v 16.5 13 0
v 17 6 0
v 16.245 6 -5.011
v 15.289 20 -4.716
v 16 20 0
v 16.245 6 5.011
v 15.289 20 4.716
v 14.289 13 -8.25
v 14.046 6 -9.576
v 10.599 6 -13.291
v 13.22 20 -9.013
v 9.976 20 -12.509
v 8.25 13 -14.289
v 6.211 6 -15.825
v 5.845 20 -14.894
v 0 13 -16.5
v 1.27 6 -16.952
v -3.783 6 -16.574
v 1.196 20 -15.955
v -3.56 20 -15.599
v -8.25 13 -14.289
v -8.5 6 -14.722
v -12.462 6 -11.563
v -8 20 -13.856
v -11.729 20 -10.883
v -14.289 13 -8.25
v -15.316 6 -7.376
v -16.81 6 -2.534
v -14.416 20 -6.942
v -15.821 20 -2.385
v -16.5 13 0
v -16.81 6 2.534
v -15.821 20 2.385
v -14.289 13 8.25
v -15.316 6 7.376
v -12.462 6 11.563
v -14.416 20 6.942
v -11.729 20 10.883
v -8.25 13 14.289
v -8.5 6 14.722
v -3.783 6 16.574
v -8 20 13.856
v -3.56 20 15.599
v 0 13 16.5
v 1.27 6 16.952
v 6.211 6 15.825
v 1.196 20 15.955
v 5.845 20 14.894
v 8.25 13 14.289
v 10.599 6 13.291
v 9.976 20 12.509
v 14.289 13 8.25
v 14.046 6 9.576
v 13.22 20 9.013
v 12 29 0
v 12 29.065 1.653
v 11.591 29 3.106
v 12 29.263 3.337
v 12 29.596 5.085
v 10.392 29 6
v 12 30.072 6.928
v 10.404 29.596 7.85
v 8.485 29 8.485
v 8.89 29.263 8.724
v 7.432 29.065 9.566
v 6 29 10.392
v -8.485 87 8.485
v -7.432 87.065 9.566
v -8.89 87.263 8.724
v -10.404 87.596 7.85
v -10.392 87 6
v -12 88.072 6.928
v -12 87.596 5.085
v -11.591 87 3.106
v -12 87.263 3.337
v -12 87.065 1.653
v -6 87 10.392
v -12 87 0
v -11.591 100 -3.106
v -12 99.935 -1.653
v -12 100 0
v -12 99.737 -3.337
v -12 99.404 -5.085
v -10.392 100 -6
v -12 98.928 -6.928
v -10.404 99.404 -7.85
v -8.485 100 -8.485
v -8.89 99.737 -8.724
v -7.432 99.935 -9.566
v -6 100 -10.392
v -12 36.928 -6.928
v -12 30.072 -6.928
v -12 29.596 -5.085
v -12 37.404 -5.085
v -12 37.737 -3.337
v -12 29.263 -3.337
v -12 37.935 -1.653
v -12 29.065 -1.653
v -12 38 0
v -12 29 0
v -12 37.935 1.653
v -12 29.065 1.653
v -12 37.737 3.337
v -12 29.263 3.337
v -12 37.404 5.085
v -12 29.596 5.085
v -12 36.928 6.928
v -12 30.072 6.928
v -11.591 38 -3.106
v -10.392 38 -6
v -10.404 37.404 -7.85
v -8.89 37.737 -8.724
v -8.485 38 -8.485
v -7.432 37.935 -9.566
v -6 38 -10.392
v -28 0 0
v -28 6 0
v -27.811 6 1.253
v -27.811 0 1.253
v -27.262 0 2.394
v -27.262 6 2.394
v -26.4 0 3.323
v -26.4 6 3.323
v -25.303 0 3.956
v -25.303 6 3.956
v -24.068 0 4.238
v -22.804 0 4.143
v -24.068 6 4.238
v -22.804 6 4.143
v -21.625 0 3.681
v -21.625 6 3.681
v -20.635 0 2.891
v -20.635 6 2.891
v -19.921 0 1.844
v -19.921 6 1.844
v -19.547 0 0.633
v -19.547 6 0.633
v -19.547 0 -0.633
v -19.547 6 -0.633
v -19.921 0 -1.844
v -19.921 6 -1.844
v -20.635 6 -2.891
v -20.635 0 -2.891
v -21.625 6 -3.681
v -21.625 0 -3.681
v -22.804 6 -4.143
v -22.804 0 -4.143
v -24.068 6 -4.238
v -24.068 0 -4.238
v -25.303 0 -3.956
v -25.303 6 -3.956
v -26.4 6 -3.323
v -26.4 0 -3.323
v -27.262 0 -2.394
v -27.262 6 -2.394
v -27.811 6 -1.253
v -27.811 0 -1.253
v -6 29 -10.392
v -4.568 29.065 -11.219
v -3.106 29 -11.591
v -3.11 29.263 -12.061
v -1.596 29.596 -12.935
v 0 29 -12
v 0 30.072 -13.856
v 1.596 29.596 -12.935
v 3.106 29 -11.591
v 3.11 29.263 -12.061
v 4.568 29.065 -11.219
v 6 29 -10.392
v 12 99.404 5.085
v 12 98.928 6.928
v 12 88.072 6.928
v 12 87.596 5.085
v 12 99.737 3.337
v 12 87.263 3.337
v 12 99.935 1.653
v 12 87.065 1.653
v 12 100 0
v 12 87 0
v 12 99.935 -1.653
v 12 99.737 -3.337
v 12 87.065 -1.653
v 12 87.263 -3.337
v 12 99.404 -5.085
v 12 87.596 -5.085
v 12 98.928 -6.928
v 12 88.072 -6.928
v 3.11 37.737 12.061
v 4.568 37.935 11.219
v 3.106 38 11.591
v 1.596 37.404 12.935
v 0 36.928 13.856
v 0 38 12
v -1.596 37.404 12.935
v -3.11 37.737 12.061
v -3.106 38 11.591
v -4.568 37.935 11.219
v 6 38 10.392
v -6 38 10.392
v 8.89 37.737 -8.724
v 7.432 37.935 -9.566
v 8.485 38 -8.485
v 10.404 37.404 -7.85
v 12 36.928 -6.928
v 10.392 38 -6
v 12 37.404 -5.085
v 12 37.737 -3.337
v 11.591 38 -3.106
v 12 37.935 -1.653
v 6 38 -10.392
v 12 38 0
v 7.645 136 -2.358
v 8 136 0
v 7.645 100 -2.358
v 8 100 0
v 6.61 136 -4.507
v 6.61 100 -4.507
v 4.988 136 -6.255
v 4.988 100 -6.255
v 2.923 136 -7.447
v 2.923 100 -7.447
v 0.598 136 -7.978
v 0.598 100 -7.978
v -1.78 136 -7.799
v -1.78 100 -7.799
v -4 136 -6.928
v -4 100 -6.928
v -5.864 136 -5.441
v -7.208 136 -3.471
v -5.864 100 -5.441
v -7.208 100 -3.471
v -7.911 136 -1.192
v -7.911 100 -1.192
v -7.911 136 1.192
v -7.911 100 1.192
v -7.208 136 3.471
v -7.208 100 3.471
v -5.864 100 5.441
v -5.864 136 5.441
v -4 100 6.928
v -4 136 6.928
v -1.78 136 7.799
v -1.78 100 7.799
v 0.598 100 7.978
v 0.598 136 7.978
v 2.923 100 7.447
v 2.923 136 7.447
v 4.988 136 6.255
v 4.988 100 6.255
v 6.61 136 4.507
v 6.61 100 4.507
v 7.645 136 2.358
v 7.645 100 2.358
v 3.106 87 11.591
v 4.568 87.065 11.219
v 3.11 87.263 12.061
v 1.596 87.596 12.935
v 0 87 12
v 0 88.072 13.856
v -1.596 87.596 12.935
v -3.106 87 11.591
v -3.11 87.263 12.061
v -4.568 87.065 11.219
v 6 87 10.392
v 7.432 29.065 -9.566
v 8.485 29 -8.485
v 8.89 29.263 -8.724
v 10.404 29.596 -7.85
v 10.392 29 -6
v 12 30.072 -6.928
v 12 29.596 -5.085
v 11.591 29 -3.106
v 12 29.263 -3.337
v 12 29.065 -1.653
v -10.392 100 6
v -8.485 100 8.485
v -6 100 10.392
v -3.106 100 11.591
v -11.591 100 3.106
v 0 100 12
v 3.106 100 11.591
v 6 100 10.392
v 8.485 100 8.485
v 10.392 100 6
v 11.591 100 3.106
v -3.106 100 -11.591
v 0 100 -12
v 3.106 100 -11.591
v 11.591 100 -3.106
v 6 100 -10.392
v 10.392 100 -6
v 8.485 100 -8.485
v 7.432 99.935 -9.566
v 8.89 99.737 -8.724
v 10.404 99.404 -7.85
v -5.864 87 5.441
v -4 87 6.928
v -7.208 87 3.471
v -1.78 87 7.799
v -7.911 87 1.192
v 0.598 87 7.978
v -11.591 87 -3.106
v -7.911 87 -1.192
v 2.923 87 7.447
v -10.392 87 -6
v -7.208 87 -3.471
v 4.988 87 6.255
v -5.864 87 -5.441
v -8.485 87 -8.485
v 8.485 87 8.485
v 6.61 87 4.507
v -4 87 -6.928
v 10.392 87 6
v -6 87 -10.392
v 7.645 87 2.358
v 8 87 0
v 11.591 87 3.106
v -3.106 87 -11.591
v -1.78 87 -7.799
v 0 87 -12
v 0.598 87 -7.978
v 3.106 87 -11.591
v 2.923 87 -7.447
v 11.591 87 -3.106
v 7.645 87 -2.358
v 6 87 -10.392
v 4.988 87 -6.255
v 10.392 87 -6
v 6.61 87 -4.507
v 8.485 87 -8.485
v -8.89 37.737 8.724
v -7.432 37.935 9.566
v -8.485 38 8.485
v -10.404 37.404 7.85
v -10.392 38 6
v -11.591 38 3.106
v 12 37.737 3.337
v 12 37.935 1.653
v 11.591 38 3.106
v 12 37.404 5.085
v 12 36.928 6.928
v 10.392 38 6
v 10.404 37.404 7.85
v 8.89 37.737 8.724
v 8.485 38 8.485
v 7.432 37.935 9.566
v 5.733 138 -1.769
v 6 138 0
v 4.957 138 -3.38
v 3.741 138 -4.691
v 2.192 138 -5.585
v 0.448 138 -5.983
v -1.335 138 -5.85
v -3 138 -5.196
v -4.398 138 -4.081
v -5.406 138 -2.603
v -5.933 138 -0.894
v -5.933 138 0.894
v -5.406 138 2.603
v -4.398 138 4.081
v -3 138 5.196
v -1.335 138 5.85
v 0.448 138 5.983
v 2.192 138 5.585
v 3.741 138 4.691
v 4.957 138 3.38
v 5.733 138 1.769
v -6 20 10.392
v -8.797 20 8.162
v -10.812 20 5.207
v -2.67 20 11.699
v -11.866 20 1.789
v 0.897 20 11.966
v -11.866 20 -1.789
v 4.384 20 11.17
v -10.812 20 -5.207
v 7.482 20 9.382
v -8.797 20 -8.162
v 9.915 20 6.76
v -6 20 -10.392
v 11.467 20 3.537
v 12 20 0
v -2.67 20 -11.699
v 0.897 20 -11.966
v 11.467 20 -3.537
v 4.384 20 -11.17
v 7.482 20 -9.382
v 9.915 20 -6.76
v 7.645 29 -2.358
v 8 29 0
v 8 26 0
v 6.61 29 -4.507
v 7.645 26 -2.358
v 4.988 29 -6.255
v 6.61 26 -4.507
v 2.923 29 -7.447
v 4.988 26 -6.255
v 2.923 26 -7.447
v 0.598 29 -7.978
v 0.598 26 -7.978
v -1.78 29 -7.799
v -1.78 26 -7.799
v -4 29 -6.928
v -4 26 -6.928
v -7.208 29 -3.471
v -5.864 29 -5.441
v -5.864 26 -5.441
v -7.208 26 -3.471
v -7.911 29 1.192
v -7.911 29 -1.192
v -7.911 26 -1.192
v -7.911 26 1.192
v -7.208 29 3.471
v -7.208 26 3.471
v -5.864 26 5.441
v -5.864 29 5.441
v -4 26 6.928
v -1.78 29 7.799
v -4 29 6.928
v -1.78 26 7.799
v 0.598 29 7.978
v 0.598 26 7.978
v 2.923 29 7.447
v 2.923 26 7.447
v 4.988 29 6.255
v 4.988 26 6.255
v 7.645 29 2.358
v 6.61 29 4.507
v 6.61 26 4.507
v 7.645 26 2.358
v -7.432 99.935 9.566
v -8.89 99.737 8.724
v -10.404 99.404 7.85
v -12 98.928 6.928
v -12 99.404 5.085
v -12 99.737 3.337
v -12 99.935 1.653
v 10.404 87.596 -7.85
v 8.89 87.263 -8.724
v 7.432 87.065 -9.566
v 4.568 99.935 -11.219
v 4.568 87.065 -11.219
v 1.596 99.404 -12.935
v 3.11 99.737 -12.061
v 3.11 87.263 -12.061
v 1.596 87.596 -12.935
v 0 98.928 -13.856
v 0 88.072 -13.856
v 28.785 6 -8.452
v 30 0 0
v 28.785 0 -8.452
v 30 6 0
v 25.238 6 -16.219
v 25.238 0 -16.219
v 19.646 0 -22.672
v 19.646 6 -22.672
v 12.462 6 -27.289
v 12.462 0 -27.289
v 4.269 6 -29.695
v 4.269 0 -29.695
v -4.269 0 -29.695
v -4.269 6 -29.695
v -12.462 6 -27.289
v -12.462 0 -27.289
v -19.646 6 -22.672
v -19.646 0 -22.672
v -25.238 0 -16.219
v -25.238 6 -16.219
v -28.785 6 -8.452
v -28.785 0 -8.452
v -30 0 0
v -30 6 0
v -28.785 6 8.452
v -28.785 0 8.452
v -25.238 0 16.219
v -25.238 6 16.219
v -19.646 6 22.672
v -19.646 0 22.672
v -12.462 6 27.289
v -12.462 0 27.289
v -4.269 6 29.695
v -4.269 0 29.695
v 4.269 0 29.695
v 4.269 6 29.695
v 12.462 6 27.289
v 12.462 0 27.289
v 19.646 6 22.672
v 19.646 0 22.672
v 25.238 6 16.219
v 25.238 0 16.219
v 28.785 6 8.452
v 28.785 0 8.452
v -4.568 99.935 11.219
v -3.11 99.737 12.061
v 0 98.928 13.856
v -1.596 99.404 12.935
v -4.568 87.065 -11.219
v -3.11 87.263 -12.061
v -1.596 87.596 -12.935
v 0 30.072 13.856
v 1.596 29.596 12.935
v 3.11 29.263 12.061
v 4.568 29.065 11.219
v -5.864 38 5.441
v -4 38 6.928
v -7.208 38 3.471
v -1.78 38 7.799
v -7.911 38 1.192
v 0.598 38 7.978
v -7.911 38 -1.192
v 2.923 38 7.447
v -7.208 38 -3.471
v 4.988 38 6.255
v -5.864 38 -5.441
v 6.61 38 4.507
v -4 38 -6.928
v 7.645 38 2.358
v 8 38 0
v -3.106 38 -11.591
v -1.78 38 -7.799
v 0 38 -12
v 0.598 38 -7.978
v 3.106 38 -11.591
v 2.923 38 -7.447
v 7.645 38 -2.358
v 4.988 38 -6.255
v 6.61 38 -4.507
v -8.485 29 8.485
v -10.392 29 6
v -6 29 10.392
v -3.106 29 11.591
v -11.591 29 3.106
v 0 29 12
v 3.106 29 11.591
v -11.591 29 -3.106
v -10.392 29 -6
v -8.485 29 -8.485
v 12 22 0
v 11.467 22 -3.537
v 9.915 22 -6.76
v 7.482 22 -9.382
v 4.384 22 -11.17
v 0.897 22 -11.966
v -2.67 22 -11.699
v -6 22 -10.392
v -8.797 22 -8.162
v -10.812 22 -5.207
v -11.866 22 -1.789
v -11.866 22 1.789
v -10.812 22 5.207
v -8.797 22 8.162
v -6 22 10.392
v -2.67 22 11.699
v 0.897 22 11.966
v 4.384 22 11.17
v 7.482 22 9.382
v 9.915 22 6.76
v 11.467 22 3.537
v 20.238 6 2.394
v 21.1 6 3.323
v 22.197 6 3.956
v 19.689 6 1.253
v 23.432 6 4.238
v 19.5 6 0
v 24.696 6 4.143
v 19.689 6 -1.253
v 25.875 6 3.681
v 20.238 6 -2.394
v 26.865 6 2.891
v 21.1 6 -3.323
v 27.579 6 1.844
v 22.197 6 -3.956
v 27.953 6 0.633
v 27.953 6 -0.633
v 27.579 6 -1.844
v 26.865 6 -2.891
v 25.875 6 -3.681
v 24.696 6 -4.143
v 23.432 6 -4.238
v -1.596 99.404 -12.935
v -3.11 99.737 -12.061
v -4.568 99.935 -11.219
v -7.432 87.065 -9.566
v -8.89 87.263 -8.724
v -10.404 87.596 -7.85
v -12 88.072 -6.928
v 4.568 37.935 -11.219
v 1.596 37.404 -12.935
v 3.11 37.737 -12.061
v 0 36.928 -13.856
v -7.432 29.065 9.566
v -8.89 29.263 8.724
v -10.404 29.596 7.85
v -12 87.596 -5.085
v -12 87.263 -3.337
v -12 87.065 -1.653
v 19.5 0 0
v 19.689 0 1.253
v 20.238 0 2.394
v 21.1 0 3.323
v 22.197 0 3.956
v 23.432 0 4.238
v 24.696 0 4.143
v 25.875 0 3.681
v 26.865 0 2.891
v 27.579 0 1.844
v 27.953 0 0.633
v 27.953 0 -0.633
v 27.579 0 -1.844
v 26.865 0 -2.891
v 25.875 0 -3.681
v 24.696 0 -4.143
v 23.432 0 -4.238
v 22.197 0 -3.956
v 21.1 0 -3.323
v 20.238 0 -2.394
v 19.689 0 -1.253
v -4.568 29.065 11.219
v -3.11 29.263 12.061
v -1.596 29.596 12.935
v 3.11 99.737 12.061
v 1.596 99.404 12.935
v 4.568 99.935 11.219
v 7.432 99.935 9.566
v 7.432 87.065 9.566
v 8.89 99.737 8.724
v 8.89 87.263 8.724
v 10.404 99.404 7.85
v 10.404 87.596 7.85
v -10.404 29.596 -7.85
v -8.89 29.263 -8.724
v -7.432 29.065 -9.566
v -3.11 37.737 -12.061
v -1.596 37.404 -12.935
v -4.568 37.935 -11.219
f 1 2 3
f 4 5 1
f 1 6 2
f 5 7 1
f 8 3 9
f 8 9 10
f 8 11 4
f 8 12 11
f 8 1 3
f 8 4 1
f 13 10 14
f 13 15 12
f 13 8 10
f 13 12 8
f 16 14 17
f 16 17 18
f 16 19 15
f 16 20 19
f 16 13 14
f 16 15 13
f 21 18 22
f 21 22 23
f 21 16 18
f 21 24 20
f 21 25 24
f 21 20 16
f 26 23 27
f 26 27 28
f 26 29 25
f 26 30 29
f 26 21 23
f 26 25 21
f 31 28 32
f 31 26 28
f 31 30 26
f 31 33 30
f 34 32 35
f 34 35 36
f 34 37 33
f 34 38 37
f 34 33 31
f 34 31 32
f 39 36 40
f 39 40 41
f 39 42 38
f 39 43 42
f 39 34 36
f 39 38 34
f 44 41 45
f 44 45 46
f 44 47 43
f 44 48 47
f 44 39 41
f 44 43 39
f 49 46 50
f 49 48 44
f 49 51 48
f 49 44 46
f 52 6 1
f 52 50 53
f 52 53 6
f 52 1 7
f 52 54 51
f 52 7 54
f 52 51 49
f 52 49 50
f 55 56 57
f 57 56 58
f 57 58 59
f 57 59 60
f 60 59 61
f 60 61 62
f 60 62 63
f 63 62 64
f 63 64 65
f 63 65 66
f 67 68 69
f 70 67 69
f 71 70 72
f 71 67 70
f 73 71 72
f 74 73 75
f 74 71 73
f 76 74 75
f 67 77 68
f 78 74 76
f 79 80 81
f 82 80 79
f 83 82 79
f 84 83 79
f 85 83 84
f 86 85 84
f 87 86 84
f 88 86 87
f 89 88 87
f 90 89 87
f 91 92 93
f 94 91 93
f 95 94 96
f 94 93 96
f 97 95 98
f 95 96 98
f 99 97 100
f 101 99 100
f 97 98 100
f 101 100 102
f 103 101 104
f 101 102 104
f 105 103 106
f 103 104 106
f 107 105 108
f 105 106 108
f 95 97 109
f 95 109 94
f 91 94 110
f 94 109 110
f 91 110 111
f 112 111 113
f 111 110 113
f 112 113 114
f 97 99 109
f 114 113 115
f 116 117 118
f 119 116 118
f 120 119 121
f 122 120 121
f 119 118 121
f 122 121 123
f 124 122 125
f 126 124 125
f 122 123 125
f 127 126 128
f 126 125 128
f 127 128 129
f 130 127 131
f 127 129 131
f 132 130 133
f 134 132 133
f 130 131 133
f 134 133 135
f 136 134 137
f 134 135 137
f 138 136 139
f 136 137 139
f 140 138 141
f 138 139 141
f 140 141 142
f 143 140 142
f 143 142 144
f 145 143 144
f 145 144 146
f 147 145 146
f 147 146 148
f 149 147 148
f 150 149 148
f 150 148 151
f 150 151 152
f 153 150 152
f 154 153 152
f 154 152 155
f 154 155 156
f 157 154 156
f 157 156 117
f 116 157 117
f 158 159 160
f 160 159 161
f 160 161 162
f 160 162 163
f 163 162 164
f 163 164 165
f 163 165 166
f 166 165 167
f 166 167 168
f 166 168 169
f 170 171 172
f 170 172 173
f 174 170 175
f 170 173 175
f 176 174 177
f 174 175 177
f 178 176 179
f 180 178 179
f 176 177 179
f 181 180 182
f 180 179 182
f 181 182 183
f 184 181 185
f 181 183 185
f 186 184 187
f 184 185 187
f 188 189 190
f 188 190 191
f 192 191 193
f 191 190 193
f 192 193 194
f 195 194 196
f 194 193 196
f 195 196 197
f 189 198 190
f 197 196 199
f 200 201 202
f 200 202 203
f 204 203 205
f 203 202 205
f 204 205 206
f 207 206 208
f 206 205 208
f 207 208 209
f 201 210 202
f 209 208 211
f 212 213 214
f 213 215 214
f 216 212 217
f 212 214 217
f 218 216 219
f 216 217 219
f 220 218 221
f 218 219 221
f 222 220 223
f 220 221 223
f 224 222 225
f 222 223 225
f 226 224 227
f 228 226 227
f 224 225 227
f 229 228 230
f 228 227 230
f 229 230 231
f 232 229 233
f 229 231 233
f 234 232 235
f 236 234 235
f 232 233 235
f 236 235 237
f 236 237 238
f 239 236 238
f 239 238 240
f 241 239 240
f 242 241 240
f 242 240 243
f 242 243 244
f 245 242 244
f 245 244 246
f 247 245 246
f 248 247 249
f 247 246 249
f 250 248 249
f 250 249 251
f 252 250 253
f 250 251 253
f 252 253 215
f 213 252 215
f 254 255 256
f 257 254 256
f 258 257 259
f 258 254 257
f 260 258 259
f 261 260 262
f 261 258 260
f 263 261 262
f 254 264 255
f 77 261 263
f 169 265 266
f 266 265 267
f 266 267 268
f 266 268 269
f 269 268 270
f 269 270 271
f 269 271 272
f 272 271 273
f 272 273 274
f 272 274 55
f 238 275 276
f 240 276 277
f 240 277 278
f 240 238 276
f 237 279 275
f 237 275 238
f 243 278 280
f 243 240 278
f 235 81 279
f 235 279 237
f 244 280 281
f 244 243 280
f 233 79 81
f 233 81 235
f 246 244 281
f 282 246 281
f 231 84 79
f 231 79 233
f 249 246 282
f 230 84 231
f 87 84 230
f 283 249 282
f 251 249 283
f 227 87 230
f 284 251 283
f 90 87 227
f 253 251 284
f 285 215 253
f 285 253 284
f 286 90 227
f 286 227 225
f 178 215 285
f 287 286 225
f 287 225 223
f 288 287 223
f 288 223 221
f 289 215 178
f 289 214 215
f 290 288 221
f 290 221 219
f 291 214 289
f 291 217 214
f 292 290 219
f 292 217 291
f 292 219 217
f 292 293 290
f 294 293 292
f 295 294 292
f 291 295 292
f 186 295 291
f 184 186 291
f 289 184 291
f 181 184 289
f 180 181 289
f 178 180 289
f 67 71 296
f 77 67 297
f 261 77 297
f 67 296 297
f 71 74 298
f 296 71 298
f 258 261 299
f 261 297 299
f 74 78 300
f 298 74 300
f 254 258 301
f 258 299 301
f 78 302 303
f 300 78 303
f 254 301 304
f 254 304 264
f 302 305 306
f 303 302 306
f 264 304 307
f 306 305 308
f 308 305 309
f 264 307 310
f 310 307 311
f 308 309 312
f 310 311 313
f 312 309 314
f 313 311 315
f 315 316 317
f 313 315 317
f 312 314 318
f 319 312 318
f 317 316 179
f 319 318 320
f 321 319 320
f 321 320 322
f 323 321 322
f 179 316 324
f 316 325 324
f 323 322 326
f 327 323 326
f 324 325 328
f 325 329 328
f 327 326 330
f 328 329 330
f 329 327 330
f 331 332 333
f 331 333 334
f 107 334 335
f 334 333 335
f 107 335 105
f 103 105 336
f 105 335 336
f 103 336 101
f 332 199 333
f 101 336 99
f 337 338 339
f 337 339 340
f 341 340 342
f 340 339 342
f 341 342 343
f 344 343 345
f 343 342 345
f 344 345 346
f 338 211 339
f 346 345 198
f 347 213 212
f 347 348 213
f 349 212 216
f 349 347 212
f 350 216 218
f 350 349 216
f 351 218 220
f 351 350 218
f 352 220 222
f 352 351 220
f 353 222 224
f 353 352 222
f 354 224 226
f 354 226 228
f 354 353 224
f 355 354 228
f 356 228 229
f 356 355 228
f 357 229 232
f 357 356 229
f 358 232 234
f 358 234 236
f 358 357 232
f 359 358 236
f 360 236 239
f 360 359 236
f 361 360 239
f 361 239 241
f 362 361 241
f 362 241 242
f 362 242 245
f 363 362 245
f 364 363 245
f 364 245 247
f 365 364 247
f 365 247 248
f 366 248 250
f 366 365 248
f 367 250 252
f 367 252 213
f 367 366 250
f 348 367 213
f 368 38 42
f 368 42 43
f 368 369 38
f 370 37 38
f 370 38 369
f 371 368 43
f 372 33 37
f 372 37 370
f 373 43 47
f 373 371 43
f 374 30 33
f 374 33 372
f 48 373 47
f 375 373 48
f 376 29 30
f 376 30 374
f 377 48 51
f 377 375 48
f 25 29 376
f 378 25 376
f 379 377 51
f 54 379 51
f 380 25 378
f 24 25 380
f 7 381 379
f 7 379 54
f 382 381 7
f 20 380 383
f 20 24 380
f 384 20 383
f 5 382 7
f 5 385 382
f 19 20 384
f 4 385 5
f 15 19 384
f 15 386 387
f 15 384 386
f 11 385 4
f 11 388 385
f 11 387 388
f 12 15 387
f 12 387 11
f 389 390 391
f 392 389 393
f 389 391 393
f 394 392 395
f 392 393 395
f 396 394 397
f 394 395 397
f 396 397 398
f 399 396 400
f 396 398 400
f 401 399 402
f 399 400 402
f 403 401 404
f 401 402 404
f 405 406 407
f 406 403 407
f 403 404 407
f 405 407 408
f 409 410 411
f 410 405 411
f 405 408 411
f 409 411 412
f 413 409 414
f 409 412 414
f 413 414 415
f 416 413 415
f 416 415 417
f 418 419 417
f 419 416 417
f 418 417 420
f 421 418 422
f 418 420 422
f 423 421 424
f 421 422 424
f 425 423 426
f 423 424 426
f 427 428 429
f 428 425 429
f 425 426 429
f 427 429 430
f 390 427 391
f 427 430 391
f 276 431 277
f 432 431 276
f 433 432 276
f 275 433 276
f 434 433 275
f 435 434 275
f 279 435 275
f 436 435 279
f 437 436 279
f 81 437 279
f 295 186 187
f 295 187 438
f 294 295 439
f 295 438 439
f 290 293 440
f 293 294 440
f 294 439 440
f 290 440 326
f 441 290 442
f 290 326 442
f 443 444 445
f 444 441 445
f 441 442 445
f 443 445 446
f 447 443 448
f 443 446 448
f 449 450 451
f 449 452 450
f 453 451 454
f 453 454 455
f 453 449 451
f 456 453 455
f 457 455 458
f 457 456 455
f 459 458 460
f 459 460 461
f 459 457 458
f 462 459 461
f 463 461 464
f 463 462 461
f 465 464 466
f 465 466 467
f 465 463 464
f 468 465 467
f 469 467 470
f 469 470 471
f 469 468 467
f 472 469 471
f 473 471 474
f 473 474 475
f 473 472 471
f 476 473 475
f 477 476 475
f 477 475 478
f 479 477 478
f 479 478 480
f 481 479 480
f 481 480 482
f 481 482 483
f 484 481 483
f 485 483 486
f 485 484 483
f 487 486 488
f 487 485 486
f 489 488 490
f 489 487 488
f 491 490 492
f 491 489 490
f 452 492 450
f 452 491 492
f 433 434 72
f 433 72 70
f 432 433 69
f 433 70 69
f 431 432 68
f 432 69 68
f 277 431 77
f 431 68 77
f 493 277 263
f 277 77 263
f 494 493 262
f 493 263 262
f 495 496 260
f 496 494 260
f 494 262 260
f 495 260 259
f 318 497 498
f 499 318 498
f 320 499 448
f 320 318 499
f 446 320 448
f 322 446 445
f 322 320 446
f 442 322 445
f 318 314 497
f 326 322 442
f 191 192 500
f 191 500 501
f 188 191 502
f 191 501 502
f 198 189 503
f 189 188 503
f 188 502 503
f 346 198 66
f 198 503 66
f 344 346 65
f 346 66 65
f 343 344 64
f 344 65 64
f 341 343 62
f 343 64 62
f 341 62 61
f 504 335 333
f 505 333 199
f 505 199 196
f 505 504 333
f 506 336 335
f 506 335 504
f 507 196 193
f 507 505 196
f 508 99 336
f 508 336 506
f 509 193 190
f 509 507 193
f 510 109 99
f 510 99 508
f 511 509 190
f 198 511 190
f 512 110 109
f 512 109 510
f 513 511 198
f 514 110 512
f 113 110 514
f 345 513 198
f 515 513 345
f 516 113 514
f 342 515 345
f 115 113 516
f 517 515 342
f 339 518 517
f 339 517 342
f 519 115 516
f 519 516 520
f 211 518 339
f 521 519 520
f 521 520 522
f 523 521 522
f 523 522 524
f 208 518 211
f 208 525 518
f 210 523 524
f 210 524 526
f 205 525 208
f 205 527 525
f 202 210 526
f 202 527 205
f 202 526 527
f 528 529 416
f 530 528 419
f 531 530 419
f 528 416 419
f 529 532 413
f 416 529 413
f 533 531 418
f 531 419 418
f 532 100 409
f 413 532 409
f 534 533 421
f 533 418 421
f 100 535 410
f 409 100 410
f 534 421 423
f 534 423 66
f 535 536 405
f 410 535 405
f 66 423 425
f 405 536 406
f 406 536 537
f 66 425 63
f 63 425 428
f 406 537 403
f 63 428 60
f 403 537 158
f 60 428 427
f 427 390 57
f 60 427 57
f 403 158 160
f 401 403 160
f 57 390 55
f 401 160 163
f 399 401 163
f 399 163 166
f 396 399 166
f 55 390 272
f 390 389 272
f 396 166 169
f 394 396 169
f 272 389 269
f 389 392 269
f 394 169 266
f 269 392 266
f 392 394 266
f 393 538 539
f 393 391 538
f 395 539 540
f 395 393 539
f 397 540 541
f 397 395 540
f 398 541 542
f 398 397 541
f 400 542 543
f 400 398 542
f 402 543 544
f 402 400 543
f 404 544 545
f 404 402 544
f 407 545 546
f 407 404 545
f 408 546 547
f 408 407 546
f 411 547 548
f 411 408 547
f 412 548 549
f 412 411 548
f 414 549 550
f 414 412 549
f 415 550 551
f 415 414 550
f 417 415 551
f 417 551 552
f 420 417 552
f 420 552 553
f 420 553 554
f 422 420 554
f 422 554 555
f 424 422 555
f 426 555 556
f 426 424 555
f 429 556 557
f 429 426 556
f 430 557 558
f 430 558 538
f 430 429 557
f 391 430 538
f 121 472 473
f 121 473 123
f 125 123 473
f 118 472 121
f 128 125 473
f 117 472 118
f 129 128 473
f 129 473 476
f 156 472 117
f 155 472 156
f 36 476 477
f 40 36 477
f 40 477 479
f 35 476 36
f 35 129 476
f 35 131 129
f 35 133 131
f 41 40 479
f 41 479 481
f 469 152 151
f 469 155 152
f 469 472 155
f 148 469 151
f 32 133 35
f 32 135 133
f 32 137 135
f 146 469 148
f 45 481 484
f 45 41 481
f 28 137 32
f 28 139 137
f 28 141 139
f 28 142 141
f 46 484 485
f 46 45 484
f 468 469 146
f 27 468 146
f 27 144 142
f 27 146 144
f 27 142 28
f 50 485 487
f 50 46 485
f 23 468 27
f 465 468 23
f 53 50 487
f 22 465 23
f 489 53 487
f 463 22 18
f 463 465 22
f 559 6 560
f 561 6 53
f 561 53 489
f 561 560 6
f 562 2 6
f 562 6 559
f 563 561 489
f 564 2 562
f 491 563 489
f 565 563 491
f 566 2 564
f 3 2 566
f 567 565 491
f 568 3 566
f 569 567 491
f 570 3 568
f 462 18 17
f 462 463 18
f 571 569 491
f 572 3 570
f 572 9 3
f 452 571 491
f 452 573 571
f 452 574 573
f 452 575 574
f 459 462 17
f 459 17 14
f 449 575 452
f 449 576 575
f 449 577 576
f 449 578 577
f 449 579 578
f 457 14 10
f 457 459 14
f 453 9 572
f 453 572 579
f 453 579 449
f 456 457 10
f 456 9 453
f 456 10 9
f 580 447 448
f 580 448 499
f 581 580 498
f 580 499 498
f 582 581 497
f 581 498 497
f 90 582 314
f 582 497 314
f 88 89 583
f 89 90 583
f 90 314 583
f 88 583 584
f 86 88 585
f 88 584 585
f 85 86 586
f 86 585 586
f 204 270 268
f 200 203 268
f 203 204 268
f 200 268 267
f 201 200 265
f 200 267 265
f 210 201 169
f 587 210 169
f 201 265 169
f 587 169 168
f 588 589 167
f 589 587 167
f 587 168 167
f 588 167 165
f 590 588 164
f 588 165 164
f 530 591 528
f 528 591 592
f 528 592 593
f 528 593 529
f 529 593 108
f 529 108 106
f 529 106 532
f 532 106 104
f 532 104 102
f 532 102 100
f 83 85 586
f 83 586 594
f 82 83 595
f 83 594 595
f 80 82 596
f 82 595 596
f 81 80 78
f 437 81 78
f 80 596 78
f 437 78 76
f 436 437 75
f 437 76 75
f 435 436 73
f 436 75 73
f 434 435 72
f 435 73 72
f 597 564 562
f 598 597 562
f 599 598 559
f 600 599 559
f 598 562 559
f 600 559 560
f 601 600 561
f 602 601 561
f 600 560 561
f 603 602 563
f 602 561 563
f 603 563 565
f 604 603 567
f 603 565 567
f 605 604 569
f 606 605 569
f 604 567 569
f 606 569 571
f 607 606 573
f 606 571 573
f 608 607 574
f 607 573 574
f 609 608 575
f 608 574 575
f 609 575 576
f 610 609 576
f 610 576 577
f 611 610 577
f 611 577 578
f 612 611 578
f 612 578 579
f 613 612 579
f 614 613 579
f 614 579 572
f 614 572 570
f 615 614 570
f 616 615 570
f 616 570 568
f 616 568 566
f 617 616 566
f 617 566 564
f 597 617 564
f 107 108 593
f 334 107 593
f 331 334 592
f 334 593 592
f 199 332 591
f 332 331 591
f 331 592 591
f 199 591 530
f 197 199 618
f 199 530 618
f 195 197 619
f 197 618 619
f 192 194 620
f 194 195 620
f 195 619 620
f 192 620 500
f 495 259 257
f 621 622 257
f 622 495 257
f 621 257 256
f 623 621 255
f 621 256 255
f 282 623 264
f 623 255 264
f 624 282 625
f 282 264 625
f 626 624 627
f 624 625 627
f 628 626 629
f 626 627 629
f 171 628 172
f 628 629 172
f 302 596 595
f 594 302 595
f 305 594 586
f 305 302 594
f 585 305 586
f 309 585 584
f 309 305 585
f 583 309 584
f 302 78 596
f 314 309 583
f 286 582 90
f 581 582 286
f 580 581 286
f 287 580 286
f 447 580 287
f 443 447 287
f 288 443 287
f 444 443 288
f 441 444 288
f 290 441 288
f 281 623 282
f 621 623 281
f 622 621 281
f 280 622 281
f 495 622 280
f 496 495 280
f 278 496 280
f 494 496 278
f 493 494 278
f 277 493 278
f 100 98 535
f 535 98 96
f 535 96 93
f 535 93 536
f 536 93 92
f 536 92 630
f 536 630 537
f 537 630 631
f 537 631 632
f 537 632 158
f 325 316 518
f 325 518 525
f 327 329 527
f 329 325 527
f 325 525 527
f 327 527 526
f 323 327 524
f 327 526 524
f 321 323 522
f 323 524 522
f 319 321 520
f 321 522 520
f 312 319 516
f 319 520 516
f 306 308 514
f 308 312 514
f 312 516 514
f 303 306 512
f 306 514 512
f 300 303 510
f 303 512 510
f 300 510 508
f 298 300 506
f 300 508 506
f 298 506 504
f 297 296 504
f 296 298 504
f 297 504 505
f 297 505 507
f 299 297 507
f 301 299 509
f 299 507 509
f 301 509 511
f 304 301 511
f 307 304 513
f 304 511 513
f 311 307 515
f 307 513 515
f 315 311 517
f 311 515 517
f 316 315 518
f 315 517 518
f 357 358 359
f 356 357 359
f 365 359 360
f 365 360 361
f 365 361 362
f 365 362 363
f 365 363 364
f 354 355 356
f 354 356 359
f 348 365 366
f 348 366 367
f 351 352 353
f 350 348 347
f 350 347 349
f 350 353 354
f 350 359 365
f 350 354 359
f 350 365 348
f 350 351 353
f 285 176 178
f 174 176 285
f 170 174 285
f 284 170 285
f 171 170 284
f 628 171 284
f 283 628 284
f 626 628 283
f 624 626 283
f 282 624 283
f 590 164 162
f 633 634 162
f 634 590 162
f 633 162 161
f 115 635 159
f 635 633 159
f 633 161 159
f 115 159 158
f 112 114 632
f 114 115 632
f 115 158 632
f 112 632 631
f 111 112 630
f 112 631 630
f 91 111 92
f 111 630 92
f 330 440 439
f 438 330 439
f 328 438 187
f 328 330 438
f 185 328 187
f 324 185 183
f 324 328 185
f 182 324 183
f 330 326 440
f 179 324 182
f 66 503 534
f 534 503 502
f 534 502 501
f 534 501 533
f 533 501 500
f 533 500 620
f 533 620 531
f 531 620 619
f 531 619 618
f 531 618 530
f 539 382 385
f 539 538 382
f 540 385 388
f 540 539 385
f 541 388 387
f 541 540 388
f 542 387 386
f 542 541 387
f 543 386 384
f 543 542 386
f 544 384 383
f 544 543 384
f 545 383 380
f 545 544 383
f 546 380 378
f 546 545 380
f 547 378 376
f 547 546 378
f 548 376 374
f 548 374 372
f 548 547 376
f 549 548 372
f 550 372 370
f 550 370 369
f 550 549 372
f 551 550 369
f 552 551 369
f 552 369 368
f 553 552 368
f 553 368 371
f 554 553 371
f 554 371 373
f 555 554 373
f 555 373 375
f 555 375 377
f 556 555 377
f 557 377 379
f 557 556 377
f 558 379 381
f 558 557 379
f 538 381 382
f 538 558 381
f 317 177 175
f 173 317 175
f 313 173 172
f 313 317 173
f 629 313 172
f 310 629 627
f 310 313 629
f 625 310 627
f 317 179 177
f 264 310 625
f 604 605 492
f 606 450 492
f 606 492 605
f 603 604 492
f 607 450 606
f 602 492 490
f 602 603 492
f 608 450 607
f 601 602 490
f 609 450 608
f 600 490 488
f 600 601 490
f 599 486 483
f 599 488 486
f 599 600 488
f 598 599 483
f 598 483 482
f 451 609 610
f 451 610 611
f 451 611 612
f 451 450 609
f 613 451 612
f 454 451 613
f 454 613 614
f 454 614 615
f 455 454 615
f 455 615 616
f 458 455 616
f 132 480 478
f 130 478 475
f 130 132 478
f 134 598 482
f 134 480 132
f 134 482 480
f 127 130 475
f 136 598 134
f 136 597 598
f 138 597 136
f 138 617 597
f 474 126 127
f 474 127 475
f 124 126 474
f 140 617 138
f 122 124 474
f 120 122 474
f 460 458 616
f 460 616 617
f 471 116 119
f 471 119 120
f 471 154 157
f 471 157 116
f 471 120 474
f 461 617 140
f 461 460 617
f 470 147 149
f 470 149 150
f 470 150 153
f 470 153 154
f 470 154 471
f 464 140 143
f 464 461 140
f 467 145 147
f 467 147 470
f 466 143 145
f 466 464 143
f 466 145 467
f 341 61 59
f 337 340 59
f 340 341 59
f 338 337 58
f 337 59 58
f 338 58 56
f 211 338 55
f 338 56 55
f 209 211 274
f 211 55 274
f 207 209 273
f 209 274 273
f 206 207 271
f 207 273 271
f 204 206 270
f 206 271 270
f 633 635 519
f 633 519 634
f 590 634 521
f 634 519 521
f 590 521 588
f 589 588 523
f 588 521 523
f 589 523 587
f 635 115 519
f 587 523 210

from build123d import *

# Parameters (mm, degrees)
EXTRUDE_1_DEPTH     = 9
EXTRUDE_2_DEPTH     = 13
SKETCH_5_R          = 4.25
CUT_EXTRUDE_1_DEPTH = 7


with BuildPart() as part:
    # Эскиз1 → Повернуть1 (revolve)
    with BuildSketch(Plane.XY, mode=Mode.PRIVATE) as revolve_1_sk:
        Polygon((0, 0), (-30, 0), (-30, 6), (-17, 6), (-16, 20), (-12, 20), (-12, 22), (-8, 26), (-8, 29), (-8, 38), (-8, 136), (-6, 138), (0, 138), align=None)
    revolve(revolve_1_sk.sketch.rotate(Axis((0, 0, 0), (0, 1, 0)), 180), axis=Axis((0, 0, 0), (0, 1, 0)))  # turned: the seam where the file's is

    # Эскиз2 → Бобышка-Вытянуть1 (add)
    with BuildSketch(Plane(origin=(0, 29, 0), x_dir=(1, 0, 0), z_dir=(0, 1, 0))):
        Polygon((0, 13.856406461), (-12, 6.92820323), (-12, -6.92820323), (0, -13.856406461), (12, -6.92820323), (12, 6.92820323), align=None)
    extrude(amount=EXTRUDE_1_DEPTH)

    # Эскиз3 → Бобышка-Вытянуть2 (add)
    with BuildSketch(Plane(origin=(0, 87, 0), x_dir=(1, 0, 0), z_dir=(0, 1, 0))):
        Polygon((12, 6.92820323), (0, 13.856406461), (-12, 6.92820323), (-12, -6.92820323), (0, -13.856406461), (12, -6.92820323), align=None)
    extrude(amount=EXTRUDE_2_DEPTH)

    # Эскиз4 → Вырез-Повернуть2 (revolve, cut)
    with BuildSketch(Plane.XY, mode=Mode.PRIVATE) as cut_revolve_2_sk:
        Polygon((-23.258330249, 100), (-12, 100), (-23.258330249, 93.5), align=None)
        Polygon((-23.258330249, 87), (-23.258330249, 93.5), (-12, 87), align=None)
        Polygon((-19.794228634, 38), (-19.794228634, 33.5), (-12, 38), align=None)
        Polygon((-19.794228634, 33.5), (-19.794228634, 29), (-12, 29), align=None)
    revolve(cut_revolve_2_sk.sketch.rotate(Axis((0, 138, 0), (0, -1, 0)), 180), axis=Axis((0, 138, 0), (0, -1, 0)), mode=Mode.SUBTRACT)  # turned: the seam where the file's is

    # Эскиз5 → Вырез-Вытянуть1 (cut, through all)
    with BuildSketch(Plane(origin=(0, 6, 0), x_dir=(1, 0, 0), z_dir=(0, 1, 0))):
        with Locations(Location((-23.75, 0, 0), (0, 0, 180))):  # turned: the seam where the file's is
            Circle(SKETCH_5_R)
        with Locations(Location((23.75, 0, 0), (0, 0, 180))):  # turned: the seam where the file's is
            Circle(SKETCH_5_R)
    extrude(amount=-CUT_EXTRUDE_1_DEPTH, mode=Mode.SUBTRACT)


solid = part.part
